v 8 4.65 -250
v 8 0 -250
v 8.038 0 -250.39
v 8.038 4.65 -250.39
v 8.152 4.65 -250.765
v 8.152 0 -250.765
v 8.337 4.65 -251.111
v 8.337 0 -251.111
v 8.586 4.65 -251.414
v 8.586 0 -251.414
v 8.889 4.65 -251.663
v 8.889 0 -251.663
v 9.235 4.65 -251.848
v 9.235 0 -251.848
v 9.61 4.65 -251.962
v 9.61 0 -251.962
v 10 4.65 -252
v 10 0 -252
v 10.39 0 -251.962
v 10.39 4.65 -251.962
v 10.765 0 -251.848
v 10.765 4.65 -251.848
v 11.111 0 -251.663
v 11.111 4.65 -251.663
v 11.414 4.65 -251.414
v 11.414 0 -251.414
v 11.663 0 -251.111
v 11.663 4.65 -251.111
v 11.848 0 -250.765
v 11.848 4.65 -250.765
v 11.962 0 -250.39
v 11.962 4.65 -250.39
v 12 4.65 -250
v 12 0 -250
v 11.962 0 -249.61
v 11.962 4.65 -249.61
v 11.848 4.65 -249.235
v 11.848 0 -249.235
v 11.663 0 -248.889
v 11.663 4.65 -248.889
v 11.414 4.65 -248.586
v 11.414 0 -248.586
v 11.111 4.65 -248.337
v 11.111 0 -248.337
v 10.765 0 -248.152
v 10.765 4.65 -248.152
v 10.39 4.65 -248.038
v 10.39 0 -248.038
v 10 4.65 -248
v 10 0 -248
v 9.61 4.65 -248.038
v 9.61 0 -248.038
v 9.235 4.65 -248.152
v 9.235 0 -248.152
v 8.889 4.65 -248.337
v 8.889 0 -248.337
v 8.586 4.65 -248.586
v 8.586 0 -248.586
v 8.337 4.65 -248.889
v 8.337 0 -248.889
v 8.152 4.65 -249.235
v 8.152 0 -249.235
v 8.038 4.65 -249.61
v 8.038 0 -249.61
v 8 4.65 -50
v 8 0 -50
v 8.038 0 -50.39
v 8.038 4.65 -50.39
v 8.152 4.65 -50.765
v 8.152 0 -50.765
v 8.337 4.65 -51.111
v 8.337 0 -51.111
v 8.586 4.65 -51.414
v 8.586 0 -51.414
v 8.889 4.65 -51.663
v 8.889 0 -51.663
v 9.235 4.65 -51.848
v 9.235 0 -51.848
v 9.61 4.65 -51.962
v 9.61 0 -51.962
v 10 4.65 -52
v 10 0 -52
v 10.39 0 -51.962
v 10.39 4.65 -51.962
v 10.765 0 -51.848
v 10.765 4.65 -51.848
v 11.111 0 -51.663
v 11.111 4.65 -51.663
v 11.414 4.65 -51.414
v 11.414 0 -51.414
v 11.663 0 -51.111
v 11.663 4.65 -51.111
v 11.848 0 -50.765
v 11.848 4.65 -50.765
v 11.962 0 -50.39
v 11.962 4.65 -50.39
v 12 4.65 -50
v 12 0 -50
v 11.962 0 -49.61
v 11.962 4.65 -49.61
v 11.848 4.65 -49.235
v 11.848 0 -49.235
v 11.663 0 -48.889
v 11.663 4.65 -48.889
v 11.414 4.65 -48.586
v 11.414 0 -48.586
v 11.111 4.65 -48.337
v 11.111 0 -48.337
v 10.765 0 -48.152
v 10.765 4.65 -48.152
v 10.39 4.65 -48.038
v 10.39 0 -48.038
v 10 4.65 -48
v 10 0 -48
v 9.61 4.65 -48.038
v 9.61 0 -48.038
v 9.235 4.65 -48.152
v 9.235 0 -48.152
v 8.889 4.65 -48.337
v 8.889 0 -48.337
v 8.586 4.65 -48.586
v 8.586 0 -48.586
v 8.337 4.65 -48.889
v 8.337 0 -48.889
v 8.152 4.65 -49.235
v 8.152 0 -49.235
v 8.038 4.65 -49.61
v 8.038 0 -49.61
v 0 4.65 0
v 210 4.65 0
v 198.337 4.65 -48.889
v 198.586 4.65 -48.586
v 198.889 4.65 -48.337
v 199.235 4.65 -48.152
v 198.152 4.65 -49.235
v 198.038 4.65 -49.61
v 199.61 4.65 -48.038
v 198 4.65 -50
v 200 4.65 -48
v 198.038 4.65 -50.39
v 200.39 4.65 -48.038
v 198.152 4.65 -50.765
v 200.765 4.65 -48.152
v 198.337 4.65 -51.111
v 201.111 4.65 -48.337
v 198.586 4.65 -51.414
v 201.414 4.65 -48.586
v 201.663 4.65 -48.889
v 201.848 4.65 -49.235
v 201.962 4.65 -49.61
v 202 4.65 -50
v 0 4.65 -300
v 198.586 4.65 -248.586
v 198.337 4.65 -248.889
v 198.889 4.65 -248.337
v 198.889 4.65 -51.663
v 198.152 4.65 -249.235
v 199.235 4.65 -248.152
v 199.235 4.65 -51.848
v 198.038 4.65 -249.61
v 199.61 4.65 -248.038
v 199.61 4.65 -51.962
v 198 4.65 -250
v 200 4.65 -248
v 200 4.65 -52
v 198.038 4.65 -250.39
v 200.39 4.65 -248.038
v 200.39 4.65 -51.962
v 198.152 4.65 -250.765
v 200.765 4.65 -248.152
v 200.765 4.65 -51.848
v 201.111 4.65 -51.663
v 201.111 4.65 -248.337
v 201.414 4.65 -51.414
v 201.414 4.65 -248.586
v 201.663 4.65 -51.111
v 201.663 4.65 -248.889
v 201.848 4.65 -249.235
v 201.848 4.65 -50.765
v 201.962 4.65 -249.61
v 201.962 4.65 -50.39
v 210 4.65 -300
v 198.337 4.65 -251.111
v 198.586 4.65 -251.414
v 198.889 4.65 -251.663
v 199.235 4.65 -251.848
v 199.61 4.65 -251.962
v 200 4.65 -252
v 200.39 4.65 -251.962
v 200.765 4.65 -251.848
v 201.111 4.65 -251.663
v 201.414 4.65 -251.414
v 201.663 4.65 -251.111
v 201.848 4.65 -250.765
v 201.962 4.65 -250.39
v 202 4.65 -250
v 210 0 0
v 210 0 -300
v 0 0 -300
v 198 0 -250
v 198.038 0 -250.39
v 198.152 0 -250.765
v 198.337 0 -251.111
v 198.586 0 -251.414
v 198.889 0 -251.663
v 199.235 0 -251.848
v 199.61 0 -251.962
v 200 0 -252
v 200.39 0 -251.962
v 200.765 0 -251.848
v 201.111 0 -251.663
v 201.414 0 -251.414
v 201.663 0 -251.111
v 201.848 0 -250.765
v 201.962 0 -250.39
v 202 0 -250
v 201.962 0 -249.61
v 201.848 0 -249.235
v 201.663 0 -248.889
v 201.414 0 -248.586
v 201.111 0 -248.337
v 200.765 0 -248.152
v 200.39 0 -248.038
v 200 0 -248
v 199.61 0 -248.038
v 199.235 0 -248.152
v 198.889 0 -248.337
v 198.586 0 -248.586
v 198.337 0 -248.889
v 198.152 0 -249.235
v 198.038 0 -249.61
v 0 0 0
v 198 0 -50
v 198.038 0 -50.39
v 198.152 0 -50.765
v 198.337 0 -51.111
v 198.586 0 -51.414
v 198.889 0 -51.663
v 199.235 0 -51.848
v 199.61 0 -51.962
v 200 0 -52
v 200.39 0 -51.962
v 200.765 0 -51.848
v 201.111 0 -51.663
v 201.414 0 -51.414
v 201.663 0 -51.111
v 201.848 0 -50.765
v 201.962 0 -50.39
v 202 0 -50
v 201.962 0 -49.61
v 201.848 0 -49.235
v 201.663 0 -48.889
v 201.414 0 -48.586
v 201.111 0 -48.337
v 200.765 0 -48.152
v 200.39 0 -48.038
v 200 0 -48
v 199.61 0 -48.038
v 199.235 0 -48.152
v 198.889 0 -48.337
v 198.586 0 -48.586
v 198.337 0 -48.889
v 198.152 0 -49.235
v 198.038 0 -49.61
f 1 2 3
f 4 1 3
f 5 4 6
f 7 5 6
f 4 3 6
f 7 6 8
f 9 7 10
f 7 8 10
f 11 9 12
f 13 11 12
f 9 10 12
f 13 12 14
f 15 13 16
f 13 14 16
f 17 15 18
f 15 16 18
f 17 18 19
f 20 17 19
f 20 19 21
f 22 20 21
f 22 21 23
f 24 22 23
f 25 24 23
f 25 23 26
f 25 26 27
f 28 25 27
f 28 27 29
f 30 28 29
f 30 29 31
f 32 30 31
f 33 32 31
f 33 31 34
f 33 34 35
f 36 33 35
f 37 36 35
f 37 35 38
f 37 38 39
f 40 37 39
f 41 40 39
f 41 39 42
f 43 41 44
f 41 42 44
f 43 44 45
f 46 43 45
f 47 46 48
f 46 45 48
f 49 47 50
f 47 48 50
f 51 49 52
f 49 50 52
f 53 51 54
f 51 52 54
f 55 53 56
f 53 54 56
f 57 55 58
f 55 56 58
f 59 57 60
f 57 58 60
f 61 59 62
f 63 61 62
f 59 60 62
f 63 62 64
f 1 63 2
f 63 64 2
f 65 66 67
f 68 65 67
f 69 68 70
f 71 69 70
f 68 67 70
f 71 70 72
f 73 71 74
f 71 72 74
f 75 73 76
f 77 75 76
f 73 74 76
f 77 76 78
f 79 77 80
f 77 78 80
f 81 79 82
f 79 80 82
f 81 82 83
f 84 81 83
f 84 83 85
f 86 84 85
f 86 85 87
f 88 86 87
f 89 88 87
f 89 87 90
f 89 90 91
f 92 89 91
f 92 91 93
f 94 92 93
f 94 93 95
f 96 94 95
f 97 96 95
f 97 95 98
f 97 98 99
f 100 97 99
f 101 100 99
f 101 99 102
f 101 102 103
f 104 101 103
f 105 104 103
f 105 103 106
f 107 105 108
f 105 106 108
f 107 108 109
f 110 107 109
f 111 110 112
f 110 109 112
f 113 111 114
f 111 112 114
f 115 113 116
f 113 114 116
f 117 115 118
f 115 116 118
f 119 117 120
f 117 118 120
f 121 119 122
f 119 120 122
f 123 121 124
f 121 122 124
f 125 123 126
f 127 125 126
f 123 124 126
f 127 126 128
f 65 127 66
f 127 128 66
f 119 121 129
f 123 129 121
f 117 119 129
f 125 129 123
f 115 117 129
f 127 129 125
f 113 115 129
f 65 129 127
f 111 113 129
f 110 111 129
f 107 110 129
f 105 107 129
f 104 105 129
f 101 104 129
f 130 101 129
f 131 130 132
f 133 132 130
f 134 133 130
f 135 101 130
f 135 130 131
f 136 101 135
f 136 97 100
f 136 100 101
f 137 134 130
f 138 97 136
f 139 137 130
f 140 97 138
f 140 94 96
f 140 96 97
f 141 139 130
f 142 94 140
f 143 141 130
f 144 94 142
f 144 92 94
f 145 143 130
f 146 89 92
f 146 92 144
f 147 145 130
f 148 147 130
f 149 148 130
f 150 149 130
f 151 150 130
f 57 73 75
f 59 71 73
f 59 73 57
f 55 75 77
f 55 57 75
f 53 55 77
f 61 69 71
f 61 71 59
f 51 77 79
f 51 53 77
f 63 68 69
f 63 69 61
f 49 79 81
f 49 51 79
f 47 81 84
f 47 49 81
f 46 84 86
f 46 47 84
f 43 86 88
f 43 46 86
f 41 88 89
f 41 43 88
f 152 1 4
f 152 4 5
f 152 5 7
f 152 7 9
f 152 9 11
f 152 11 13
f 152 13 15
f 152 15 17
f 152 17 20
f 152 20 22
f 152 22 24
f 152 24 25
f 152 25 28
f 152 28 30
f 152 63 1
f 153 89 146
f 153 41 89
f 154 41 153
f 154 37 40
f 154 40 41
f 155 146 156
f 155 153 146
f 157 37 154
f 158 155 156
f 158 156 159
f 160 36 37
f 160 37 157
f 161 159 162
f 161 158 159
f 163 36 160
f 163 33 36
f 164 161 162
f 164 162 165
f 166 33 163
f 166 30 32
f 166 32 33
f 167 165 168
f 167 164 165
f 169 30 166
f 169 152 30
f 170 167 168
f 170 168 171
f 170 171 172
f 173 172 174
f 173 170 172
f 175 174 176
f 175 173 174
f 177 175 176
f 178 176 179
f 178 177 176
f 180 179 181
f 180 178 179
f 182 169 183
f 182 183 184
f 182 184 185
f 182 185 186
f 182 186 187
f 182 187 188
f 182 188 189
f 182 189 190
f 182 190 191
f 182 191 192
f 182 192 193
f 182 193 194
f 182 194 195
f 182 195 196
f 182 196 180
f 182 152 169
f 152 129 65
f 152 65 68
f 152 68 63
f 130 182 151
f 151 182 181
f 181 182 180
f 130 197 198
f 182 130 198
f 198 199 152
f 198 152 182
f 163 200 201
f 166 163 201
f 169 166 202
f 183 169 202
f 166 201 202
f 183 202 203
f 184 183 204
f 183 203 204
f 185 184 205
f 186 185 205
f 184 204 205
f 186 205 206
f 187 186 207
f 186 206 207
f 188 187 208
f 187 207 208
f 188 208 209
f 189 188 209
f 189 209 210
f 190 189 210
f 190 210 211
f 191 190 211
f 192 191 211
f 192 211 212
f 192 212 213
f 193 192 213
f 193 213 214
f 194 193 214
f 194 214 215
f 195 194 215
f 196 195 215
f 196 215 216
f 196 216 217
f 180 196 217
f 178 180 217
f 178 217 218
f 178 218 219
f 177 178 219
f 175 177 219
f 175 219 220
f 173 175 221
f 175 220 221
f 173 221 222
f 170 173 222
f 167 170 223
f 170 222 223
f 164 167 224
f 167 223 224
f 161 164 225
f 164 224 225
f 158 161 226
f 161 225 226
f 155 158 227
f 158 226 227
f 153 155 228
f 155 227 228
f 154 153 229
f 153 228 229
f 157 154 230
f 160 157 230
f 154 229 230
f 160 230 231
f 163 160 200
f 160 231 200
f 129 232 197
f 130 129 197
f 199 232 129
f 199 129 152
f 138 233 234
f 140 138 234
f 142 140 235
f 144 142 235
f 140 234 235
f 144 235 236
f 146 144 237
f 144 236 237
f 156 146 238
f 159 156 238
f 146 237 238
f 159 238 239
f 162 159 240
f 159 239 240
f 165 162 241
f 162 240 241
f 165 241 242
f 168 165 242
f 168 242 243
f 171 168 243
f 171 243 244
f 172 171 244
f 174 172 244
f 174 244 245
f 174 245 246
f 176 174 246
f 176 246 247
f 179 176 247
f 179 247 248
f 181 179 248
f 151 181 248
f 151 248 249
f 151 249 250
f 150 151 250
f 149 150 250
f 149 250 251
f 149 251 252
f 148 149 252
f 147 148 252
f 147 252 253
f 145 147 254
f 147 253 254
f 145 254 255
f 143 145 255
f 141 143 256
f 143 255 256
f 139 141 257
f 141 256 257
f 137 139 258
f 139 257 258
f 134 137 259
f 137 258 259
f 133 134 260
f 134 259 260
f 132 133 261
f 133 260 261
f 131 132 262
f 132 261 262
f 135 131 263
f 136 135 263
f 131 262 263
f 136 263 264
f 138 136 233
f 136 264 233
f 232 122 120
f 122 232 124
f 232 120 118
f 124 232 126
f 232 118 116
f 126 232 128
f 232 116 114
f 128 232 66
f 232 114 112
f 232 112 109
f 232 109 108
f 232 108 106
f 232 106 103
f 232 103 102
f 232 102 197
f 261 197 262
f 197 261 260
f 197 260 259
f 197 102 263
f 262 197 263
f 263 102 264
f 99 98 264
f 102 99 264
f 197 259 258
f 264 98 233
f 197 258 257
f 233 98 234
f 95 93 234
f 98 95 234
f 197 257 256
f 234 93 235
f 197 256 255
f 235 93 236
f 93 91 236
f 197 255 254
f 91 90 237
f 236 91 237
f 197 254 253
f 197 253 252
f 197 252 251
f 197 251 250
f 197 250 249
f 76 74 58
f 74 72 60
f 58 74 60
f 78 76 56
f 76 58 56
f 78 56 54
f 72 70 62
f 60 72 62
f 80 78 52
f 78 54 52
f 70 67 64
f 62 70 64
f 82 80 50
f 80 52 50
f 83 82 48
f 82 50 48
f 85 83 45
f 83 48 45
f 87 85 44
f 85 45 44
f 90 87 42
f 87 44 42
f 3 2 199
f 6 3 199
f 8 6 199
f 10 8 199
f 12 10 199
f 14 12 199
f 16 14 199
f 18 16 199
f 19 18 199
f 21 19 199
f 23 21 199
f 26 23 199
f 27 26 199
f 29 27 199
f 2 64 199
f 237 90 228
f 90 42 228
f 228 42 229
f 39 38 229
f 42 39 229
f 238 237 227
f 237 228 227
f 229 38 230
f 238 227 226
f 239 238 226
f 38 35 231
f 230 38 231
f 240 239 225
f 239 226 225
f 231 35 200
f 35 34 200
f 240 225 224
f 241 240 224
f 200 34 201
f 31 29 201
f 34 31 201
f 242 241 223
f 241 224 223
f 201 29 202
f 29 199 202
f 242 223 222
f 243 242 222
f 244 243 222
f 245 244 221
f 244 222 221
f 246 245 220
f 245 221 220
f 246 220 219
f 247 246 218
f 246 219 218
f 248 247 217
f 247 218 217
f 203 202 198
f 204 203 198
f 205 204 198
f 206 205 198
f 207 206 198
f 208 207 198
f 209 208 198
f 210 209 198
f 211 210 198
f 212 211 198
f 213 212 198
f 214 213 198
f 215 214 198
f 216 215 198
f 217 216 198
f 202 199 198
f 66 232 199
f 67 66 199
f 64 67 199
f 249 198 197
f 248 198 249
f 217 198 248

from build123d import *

# Parameters (mm, degrees)
SKETCH_1_W      = 210
SKETCH_1_H      = 300
EXTRUDE_1_DEPTH = 4.65
MM_1_D          = 4


with BuildPart() as part:
    # 草图1 → 凸台-拉伸1 (new body)
    with BuildSketch(Plane(origin=(0, 0, 0), x_dir=(1, 0, 0), z_dir=(0, 1, 0))):
        with Locations((105, 150)):
            Rectangle(SKETCH_1_W, SKETCH_1_H)
    extrude(amount=EXTRUDE_1_DEPTH)

    # 大小mm 暗销孔1 (through all)
    with Locations(Plane(origin=(0, 4.65, 0), x_dir=(1, 0, 0), z_dir=(0, 1, 0))):
        with Locations((10, 250), (10, 50), (200, 250), (200, 50)):
            Hole(MM_1_D / 2)


solid = part.part
